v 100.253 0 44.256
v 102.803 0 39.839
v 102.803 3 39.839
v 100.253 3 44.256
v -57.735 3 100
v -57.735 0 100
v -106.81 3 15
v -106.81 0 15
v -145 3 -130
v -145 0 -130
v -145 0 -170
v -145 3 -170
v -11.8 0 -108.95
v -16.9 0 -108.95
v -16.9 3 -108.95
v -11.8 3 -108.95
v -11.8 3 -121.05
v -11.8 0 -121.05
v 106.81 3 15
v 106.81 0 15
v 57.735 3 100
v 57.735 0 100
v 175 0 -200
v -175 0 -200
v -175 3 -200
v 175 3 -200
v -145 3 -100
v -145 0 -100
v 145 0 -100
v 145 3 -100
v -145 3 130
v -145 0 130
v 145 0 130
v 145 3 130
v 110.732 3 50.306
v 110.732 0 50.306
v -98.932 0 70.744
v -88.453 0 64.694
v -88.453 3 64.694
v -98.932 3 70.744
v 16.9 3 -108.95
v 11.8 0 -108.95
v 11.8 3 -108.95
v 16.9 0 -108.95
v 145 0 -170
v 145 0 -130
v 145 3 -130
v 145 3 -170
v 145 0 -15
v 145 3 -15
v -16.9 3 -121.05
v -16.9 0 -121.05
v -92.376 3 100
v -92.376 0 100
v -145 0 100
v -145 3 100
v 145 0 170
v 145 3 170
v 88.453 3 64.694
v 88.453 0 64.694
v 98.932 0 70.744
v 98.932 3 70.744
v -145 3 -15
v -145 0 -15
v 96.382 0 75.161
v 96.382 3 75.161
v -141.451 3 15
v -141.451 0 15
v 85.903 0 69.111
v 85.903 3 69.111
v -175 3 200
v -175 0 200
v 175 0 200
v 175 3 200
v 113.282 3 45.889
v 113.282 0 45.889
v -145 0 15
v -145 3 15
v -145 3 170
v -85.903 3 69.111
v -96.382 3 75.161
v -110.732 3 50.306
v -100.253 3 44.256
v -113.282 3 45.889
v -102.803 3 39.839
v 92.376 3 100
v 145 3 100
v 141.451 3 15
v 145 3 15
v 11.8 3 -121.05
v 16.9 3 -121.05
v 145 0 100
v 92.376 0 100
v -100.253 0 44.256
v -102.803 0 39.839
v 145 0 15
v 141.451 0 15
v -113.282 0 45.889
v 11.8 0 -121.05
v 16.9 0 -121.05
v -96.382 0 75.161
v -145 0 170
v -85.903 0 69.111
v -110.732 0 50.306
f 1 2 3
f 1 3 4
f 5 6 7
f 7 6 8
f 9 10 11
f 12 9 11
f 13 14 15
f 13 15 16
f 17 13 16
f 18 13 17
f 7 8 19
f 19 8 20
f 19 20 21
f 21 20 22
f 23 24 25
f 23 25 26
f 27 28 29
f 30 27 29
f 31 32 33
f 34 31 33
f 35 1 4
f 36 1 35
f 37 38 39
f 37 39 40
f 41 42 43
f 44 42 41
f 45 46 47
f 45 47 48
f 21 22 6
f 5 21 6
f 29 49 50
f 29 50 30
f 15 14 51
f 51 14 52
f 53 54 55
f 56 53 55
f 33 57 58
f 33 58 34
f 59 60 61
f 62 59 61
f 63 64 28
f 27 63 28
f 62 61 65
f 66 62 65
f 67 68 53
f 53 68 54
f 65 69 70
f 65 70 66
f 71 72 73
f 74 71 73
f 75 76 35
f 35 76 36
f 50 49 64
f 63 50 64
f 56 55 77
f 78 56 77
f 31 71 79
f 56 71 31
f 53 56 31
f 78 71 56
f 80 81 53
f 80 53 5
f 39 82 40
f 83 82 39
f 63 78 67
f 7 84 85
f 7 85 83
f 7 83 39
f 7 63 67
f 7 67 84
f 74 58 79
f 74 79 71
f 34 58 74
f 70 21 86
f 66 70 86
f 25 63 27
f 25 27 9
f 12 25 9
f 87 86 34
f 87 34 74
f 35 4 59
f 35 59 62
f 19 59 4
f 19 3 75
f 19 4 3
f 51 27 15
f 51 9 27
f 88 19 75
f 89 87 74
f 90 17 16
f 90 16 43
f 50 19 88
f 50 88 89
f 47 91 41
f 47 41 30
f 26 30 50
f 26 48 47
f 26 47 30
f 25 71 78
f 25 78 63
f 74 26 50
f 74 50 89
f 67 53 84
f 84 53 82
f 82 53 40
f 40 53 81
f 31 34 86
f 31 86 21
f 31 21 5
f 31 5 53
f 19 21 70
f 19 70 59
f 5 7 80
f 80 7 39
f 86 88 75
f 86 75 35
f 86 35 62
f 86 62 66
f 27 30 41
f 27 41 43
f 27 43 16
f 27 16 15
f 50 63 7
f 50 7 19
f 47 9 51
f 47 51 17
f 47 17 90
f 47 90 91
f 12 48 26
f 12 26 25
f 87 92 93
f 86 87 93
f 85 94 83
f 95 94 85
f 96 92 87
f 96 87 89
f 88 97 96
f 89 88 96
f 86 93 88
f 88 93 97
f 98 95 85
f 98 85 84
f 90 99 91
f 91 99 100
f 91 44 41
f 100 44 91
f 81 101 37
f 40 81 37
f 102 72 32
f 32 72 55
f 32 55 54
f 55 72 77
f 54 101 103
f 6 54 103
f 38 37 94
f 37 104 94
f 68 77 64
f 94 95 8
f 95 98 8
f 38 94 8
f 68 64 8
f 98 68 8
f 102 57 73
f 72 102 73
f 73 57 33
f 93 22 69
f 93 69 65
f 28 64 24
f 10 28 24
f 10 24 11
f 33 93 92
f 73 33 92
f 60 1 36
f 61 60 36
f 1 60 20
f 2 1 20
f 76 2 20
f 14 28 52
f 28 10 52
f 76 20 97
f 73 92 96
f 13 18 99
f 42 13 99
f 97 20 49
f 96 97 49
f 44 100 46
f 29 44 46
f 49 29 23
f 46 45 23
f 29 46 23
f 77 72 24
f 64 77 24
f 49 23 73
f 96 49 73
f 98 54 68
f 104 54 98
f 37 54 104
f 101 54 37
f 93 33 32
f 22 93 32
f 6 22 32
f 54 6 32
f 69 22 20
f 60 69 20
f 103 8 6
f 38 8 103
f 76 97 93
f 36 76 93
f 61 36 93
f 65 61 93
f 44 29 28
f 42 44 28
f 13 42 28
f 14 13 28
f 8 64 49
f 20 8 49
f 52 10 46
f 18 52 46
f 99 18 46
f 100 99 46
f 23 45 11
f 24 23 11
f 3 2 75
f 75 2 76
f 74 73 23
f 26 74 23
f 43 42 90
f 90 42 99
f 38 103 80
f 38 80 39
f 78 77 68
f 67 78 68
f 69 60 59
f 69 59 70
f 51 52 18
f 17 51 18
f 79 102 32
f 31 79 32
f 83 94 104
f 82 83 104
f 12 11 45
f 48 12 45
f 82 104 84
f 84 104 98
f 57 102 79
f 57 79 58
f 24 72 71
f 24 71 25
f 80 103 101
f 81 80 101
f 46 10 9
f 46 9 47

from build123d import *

# Parameters (mm, degrees)
CROQUIS1_W              = 350
CROQUIS1_H              = 400
CROQUIS1_W_2            = 290
CROQUIS1_H_2            = 340
CROQUIS1_H_3            = 30
SALIENTE_EXTRUIR1_DEPTH = 3
CROQUIS9_W              = 5.1
CROQUIS9_H              = 12.1
CORTAR_EXTRUIR3_DEPTH   = 4
MATRIZC2_COUNT          = 3


with BuildPart() as part:
    # Croquis1 → Saliente-Extruir1 (new body)
    with BuildSketch(Plane(origin=(0, 0, 0), x_dir=(1, 0, 0), z_dir=(0, 1, 0))):
        Rectangle(CROQUIS1_W, CROQUIS1_H)
        Rectangle(CROQUIS1_W_2, CROQUIS1_H_2, mode=Mode.SUBTRACT)
        with Locations((0, 115)):
            Rectangle(CROQUIS1_W_2, CROQUIS1_H_3)
        Polygon((-145, 15), (-145, -15), (-141.450815951, -15), (-106.8097998, -15), (106.8097998, -15), (141.450815951, -15), (145, -15), (145, 15), align=None)
        Polygon((-145, -100), (-145, -130), (145, -130), (145, -100), (92.37604307, -100), (57.735026919, -100), (-57.735026919, -100), (-92.37604307, -100), align=None)
        Polygon((-141.450815951, -15), (-92.37604307, -100), (-57.735026919, -100), (-106.8097998, -15), align=None)
        Polygon((57.735026919, -100), (92.37604307, -100), (141.450815951, -15), (106.8097998, -15), align=None)
    extrude(amount=SALIENTE_EXTRUIR1_DEPTH)

    # Croquis9 → Cortar-Extruir3 (cut, through all)
    with BuildSketch(Plane(origin=(0, 0, 0), x_dir=(1, 0, 0), z_dir=(0, 1, 0))):
        with Locations((-14.35, 115)):
            Rectangle(CROQUIS9_W, CROQUIS9_H)
        with Locations((14.35, 115)):
            Rectangle(CROQUIS9_W, CROQUIS9_H)
    cortar_extruir3 = extrude(amount=CORTAR_EXTRUIR3_DEPTH, mode=Mode.SUBTRACT)

    # MatrizC2: Cortar-Extruir3 ×3 about axis
    matrizc2_axis = Axis((0, 0, 0), (0, 1, 0))
    for i in range(1, MATRIZC2_COUNT):
        add(cortar_extruir3.rotate(matrizc2_axis, i * 360 / MATRIZC2_COUNT), mode=Mode.SUBTRACT)


solid = part.part
